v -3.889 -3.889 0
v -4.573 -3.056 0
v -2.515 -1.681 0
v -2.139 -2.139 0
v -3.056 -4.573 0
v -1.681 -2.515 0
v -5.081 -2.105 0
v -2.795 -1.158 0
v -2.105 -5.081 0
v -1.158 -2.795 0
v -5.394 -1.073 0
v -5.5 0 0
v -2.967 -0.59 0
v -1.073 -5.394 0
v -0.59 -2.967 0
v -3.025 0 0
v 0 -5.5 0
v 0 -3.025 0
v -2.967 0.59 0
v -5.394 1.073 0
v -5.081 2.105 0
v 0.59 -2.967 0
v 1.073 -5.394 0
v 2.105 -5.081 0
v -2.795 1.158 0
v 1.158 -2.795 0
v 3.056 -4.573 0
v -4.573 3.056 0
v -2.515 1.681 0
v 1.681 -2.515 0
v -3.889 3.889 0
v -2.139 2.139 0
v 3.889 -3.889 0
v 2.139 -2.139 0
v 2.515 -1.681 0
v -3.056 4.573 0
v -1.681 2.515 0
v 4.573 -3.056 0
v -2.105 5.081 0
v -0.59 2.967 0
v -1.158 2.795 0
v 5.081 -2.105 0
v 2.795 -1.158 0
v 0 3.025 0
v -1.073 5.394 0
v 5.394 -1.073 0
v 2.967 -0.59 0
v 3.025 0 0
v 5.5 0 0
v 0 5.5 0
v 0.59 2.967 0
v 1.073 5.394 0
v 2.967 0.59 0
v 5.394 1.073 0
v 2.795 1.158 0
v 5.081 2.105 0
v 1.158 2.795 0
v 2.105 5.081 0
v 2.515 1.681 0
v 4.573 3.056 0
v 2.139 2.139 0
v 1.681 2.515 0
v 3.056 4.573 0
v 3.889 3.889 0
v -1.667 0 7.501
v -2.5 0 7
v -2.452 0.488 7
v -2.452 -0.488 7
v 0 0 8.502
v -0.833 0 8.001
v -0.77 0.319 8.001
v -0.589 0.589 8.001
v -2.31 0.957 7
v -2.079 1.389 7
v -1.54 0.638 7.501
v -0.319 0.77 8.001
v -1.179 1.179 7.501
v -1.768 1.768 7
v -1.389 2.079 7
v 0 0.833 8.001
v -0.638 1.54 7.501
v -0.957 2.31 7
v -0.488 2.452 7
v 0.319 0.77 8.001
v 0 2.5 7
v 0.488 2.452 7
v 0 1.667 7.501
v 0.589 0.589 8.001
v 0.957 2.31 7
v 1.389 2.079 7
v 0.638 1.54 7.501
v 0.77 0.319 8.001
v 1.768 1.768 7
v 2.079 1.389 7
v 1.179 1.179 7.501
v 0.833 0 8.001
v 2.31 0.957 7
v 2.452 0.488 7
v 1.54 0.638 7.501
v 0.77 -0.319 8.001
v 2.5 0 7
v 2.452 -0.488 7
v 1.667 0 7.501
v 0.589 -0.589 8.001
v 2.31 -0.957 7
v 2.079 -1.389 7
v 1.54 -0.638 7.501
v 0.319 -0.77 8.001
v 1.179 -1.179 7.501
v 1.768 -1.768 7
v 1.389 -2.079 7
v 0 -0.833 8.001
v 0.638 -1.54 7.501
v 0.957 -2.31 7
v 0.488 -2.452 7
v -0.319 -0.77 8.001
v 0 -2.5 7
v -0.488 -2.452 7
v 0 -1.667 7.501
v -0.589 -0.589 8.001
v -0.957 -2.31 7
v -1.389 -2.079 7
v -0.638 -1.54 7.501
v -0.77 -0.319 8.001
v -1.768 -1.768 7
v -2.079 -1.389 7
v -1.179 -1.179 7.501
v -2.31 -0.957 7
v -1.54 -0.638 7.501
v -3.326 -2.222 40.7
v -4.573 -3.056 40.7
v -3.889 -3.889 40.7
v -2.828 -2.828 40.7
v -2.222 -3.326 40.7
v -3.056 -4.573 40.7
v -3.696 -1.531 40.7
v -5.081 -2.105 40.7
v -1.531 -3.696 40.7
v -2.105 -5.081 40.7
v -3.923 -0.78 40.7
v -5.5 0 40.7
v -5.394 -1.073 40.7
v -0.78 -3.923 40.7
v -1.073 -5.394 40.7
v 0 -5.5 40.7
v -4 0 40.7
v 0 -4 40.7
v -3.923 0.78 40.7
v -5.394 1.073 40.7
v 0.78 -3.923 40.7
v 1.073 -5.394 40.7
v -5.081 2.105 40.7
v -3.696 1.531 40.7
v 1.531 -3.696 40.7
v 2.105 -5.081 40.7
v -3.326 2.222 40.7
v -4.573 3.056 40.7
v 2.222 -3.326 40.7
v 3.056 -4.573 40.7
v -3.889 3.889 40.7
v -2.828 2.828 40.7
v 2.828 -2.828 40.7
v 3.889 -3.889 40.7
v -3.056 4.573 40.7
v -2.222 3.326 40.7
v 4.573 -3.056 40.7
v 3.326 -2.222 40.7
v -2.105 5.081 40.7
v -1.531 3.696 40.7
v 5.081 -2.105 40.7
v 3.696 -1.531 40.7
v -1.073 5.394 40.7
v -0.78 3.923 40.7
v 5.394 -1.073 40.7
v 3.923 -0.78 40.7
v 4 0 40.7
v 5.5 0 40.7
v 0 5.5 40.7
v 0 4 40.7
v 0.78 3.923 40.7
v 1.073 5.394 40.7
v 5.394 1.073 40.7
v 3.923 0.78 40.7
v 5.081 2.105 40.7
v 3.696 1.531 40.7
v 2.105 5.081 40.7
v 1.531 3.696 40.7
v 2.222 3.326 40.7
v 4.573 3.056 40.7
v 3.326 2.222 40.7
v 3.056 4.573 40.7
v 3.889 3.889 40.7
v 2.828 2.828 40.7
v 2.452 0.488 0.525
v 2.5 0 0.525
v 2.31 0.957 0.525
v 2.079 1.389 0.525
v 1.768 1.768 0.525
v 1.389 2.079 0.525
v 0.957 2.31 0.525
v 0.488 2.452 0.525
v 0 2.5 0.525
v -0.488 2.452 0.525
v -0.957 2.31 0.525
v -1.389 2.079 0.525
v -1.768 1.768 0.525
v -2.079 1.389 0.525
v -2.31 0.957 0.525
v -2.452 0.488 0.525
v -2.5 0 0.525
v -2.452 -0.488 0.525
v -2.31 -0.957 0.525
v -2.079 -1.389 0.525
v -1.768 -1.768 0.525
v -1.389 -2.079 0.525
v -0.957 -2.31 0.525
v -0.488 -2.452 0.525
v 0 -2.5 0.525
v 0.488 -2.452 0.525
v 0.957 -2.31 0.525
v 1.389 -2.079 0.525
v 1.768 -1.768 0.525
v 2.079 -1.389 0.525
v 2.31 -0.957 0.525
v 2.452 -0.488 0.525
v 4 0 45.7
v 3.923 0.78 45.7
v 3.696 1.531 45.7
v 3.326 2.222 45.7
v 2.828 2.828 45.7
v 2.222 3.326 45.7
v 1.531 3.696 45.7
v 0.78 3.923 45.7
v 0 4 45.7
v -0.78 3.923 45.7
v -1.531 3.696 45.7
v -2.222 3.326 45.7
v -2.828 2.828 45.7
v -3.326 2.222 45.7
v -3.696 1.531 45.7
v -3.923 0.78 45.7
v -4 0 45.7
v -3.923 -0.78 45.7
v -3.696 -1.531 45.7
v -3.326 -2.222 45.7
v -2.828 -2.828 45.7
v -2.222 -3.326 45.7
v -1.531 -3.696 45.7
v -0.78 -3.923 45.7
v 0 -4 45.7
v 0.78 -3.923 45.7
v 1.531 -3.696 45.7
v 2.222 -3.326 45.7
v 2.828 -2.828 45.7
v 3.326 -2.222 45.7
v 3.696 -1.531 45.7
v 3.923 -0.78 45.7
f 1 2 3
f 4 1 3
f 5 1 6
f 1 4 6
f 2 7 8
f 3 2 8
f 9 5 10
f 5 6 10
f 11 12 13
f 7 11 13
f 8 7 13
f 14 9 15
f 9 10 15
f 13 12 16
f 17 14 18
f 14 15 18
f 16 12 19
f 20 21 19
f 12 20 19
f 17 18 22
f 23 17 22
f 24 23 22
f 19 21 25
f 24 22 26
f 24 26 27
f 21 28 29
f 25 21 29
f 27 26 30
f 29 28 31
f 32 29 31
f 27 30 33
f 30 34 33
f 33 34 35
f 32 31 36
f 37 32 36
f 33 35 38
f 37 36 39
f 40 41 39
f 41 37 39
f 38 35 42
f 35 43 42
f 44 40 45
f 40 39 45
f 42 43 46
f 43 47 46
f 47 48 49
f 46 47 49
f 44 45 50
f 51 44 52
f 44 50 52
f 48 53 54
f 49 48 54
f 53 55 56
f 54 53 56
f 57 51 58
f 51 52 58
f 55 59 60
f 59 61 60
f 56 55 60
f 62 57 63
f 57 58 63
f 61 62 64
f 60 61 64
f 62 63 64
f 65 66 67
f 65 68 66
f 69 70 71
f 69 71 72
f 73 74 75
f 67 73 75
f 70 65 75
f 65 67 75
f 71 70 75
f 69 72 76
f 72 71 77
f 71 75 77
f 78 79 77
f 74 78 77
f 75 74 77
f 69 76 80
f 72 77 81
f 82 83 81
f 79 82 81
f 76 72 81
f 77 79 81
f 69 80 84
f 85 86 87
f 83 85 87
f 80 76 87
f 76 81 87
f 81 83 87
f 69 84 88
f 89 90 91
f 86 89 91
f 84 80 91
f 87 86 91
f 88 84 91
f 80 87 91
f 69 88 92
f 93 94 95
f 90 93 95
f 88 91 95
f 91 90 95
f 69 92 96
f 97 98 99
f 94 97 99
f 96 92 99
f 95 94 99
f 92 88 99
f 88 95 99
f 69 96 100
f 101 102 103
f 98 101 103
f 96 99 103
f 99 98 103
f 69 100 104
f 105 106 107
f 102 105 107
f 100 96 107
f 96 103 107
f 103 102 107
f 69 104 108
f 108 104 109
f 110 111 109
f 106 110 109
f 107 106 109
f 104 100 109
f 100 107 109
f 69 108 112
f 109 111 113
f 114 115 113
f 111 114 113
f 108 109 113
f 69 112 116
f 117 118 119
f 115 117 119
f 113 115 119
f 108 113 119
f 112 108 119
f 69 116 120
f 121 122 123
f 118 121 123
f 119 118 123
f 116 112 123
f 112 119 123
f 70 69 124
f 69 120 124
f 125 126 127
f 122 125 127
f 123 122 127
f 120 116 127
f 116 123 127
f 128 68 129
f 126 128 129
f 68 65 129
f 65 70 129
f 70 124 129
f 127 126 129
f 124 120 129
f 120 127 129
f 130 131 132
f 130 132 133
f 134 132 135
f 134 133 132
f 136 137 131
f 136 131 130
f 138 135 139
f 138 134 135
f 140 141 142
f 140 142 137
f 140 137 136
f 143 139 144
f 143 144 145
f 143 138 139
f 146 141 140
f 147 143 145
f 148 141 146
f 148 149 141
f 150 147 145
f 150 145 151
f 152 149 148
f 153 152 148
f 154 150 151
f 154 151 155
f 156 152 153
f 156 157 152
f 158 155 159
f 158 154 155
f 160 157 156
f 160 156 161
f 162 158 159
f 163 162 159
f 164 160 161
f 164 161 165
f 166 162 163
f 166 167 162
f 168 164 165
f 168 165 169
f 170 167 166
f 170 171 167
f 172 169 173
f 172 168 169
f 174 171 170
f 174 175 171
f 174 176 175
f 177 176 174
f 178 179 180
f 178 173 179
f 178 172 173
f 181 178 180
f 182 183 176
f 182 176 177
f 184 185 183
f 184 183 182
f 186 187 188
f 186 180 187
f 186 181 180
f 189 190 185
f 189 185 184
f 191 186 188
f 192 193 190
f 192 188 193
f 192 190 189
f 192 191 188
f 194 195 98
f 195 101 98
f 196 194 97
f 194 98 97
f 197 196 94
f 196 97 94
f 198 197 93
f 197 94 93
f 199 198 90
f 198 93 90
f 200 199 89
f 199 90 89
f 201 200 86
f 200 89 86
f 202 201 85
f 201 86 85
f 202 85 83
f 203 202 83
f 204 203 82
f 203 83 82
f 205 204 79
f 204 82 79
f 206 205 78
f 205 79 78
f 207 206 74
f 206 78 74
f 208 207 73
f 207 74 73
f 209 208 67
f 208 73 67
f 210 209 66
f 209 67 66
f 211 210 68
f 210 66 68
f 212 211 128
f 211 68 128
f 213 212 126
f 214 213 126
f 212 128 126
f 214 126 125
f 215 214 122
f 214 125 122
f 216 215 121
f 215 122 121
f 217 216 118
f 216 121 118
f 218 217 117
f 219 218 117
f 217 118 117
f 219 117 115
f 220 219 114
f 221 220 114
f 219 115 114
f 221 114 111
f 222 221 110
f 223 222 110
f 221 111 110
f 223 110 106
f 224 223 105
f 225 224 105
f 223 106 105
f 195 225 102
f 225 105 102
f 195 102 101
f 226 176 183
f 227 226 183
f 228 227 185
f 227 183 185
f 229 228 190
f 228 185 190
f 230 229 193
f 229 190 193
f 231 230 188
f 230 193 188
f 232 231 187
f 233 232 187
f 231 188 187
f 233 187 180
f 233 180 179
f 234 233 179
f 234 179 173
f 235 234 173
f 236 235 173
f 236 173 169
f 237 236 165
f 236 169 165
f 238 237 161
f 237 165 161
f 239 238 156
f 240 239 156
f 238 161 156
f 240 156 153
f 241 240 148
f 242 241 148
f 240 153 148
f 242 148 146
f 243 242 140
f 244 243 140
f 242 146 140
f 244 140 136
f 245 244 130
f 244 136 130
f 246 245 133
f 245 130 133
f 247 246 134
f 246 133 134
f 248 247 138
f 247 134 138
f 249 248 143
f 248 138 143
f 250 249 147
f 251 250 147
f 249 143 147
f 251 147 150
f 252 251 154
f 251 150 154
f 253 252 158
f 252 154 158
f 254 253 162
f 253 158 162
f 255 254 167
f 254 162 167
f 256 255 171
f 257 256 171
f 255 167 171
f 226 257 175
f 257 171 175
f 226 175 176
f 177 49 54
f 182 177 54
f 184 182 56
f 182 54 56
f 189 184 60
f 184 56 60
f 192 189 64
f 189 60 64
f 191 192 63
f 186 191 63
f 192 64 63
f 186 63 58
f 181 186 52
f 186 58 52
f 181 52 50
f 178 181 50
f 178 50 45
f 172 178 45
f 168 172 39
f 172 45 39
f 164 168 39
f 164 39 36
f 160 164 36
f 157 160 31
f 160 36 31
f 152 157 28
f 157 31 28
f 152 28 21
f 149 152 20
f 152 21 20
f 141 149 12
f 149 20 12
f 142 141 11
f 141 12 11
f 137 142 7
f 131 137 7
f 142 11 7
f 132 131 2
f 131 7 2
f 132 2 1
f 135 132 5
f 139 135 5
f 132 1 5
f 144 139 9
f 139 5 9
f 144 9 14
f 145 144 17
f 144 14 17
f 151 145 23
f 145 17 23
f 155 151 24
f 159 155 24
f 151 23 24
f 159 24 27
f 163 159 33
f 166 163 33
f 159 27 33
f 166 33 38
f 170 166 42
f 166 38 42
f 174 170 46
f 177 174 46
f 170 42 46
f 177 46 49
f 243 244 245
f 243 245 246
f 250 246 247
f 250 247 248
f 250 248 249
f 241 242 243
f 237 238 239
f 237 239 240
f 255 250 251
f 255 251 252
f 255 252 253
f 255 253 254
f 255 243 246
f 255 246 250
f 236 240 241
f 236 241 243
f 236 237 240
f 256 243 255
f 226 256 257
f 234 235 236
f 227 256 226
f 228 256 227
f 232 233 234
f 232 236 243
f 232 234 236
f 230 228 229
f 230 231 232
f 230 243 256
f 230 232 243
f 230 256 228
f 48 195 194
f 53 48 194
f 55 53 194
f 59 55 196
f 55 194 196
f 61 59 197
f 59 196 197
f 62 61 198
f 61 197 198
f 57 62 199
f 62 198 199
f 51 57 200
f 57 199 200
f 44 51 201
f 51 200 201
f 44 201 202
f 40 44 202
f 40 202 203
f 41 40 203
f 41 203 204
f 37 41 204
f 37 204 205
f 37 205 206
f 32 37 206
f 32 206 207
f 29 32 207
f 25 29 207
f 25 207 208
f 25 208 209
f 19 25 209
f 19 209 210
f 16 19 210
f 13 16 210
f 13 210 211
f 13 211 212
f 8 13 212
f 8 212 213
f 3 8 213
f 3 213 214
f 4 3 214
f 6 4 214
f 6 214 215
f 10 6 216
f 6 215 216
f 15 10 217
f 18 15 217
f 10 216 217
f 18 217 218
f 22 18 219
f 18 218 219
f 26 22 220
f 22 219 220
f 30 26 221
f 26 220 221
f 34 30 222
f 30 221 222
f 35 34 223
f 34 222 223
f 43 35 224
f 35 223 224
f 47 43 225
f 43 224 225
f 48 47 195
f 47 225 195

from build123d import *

# Parameters (mm, degrees)
SKETCH1_R                       = 5.5
BOSS_EXTRUDE1_DEPTH             = 40.7
SKETCH2_R                       = 4
BOSS_EXTRUDE2_DEPTH             = 5
M6X1_0_TAPPED_HOLE1_D           = 5
M6X1_0_TAPPED_HOLE1_DEPTH       = 7
M6X1_0_TAPPED_HOLE1_CSINK_D     = 6.05
M6X1_0_TAPPED_HOLE1_CSINK_ANGLE = 90
M6X1_0_TAPPED_HOLE1_TIP         = 1.502151548


with BuildPart() as part:
    # Sketch1 → Boss-Extrude1 (new body)
    with BuildSketch(Plane.XY):
        Circle(SKETCH1_R)
    extrude(amount=BOSS_EXTRUDE1_DEPTH)

    # Sketch2 → Boss-Extrude2 (add)
    with BuildSketch(Plane.XY.offset(40.7)):
        Circle(SKETCH2_R)
    extrude(amount=BOSS_EXTRUDE2_DEPTH)

    # M6x1.0 Tapped Hole1
    with Locations(Plane(origin=(0, 0, 0), x_dir=(-1, 0, 0), z_dir=(0, 0, -1))):
        with Locations((0, 0)):
            CounterSinkHole(M6X1_0_TAPPED_HOLE1_D / 2, M6X1_0_TAPPED_HOLE1_CSINK_D / 2, depth=M6X1_0_TAPPED_HOLE1_DEPTH, counter_sink_angle=M6X1_0_TAPPED_HOLE1_CSINK_ANGLE)
            with Locations((0, 0, -(M6X1_0_TAPPED_HOLE1_DEPTH + M6X1_0_TAPPED_HOLE1_TIP / 2))):  # 118° drill point
                Cone(0, M6X1_0_TAPPED_HOLE1_D / 2, M6X1_0_TAPPED_HOLE1_TIP, mode=Mode.SUBTRACT)


solid = part.part
